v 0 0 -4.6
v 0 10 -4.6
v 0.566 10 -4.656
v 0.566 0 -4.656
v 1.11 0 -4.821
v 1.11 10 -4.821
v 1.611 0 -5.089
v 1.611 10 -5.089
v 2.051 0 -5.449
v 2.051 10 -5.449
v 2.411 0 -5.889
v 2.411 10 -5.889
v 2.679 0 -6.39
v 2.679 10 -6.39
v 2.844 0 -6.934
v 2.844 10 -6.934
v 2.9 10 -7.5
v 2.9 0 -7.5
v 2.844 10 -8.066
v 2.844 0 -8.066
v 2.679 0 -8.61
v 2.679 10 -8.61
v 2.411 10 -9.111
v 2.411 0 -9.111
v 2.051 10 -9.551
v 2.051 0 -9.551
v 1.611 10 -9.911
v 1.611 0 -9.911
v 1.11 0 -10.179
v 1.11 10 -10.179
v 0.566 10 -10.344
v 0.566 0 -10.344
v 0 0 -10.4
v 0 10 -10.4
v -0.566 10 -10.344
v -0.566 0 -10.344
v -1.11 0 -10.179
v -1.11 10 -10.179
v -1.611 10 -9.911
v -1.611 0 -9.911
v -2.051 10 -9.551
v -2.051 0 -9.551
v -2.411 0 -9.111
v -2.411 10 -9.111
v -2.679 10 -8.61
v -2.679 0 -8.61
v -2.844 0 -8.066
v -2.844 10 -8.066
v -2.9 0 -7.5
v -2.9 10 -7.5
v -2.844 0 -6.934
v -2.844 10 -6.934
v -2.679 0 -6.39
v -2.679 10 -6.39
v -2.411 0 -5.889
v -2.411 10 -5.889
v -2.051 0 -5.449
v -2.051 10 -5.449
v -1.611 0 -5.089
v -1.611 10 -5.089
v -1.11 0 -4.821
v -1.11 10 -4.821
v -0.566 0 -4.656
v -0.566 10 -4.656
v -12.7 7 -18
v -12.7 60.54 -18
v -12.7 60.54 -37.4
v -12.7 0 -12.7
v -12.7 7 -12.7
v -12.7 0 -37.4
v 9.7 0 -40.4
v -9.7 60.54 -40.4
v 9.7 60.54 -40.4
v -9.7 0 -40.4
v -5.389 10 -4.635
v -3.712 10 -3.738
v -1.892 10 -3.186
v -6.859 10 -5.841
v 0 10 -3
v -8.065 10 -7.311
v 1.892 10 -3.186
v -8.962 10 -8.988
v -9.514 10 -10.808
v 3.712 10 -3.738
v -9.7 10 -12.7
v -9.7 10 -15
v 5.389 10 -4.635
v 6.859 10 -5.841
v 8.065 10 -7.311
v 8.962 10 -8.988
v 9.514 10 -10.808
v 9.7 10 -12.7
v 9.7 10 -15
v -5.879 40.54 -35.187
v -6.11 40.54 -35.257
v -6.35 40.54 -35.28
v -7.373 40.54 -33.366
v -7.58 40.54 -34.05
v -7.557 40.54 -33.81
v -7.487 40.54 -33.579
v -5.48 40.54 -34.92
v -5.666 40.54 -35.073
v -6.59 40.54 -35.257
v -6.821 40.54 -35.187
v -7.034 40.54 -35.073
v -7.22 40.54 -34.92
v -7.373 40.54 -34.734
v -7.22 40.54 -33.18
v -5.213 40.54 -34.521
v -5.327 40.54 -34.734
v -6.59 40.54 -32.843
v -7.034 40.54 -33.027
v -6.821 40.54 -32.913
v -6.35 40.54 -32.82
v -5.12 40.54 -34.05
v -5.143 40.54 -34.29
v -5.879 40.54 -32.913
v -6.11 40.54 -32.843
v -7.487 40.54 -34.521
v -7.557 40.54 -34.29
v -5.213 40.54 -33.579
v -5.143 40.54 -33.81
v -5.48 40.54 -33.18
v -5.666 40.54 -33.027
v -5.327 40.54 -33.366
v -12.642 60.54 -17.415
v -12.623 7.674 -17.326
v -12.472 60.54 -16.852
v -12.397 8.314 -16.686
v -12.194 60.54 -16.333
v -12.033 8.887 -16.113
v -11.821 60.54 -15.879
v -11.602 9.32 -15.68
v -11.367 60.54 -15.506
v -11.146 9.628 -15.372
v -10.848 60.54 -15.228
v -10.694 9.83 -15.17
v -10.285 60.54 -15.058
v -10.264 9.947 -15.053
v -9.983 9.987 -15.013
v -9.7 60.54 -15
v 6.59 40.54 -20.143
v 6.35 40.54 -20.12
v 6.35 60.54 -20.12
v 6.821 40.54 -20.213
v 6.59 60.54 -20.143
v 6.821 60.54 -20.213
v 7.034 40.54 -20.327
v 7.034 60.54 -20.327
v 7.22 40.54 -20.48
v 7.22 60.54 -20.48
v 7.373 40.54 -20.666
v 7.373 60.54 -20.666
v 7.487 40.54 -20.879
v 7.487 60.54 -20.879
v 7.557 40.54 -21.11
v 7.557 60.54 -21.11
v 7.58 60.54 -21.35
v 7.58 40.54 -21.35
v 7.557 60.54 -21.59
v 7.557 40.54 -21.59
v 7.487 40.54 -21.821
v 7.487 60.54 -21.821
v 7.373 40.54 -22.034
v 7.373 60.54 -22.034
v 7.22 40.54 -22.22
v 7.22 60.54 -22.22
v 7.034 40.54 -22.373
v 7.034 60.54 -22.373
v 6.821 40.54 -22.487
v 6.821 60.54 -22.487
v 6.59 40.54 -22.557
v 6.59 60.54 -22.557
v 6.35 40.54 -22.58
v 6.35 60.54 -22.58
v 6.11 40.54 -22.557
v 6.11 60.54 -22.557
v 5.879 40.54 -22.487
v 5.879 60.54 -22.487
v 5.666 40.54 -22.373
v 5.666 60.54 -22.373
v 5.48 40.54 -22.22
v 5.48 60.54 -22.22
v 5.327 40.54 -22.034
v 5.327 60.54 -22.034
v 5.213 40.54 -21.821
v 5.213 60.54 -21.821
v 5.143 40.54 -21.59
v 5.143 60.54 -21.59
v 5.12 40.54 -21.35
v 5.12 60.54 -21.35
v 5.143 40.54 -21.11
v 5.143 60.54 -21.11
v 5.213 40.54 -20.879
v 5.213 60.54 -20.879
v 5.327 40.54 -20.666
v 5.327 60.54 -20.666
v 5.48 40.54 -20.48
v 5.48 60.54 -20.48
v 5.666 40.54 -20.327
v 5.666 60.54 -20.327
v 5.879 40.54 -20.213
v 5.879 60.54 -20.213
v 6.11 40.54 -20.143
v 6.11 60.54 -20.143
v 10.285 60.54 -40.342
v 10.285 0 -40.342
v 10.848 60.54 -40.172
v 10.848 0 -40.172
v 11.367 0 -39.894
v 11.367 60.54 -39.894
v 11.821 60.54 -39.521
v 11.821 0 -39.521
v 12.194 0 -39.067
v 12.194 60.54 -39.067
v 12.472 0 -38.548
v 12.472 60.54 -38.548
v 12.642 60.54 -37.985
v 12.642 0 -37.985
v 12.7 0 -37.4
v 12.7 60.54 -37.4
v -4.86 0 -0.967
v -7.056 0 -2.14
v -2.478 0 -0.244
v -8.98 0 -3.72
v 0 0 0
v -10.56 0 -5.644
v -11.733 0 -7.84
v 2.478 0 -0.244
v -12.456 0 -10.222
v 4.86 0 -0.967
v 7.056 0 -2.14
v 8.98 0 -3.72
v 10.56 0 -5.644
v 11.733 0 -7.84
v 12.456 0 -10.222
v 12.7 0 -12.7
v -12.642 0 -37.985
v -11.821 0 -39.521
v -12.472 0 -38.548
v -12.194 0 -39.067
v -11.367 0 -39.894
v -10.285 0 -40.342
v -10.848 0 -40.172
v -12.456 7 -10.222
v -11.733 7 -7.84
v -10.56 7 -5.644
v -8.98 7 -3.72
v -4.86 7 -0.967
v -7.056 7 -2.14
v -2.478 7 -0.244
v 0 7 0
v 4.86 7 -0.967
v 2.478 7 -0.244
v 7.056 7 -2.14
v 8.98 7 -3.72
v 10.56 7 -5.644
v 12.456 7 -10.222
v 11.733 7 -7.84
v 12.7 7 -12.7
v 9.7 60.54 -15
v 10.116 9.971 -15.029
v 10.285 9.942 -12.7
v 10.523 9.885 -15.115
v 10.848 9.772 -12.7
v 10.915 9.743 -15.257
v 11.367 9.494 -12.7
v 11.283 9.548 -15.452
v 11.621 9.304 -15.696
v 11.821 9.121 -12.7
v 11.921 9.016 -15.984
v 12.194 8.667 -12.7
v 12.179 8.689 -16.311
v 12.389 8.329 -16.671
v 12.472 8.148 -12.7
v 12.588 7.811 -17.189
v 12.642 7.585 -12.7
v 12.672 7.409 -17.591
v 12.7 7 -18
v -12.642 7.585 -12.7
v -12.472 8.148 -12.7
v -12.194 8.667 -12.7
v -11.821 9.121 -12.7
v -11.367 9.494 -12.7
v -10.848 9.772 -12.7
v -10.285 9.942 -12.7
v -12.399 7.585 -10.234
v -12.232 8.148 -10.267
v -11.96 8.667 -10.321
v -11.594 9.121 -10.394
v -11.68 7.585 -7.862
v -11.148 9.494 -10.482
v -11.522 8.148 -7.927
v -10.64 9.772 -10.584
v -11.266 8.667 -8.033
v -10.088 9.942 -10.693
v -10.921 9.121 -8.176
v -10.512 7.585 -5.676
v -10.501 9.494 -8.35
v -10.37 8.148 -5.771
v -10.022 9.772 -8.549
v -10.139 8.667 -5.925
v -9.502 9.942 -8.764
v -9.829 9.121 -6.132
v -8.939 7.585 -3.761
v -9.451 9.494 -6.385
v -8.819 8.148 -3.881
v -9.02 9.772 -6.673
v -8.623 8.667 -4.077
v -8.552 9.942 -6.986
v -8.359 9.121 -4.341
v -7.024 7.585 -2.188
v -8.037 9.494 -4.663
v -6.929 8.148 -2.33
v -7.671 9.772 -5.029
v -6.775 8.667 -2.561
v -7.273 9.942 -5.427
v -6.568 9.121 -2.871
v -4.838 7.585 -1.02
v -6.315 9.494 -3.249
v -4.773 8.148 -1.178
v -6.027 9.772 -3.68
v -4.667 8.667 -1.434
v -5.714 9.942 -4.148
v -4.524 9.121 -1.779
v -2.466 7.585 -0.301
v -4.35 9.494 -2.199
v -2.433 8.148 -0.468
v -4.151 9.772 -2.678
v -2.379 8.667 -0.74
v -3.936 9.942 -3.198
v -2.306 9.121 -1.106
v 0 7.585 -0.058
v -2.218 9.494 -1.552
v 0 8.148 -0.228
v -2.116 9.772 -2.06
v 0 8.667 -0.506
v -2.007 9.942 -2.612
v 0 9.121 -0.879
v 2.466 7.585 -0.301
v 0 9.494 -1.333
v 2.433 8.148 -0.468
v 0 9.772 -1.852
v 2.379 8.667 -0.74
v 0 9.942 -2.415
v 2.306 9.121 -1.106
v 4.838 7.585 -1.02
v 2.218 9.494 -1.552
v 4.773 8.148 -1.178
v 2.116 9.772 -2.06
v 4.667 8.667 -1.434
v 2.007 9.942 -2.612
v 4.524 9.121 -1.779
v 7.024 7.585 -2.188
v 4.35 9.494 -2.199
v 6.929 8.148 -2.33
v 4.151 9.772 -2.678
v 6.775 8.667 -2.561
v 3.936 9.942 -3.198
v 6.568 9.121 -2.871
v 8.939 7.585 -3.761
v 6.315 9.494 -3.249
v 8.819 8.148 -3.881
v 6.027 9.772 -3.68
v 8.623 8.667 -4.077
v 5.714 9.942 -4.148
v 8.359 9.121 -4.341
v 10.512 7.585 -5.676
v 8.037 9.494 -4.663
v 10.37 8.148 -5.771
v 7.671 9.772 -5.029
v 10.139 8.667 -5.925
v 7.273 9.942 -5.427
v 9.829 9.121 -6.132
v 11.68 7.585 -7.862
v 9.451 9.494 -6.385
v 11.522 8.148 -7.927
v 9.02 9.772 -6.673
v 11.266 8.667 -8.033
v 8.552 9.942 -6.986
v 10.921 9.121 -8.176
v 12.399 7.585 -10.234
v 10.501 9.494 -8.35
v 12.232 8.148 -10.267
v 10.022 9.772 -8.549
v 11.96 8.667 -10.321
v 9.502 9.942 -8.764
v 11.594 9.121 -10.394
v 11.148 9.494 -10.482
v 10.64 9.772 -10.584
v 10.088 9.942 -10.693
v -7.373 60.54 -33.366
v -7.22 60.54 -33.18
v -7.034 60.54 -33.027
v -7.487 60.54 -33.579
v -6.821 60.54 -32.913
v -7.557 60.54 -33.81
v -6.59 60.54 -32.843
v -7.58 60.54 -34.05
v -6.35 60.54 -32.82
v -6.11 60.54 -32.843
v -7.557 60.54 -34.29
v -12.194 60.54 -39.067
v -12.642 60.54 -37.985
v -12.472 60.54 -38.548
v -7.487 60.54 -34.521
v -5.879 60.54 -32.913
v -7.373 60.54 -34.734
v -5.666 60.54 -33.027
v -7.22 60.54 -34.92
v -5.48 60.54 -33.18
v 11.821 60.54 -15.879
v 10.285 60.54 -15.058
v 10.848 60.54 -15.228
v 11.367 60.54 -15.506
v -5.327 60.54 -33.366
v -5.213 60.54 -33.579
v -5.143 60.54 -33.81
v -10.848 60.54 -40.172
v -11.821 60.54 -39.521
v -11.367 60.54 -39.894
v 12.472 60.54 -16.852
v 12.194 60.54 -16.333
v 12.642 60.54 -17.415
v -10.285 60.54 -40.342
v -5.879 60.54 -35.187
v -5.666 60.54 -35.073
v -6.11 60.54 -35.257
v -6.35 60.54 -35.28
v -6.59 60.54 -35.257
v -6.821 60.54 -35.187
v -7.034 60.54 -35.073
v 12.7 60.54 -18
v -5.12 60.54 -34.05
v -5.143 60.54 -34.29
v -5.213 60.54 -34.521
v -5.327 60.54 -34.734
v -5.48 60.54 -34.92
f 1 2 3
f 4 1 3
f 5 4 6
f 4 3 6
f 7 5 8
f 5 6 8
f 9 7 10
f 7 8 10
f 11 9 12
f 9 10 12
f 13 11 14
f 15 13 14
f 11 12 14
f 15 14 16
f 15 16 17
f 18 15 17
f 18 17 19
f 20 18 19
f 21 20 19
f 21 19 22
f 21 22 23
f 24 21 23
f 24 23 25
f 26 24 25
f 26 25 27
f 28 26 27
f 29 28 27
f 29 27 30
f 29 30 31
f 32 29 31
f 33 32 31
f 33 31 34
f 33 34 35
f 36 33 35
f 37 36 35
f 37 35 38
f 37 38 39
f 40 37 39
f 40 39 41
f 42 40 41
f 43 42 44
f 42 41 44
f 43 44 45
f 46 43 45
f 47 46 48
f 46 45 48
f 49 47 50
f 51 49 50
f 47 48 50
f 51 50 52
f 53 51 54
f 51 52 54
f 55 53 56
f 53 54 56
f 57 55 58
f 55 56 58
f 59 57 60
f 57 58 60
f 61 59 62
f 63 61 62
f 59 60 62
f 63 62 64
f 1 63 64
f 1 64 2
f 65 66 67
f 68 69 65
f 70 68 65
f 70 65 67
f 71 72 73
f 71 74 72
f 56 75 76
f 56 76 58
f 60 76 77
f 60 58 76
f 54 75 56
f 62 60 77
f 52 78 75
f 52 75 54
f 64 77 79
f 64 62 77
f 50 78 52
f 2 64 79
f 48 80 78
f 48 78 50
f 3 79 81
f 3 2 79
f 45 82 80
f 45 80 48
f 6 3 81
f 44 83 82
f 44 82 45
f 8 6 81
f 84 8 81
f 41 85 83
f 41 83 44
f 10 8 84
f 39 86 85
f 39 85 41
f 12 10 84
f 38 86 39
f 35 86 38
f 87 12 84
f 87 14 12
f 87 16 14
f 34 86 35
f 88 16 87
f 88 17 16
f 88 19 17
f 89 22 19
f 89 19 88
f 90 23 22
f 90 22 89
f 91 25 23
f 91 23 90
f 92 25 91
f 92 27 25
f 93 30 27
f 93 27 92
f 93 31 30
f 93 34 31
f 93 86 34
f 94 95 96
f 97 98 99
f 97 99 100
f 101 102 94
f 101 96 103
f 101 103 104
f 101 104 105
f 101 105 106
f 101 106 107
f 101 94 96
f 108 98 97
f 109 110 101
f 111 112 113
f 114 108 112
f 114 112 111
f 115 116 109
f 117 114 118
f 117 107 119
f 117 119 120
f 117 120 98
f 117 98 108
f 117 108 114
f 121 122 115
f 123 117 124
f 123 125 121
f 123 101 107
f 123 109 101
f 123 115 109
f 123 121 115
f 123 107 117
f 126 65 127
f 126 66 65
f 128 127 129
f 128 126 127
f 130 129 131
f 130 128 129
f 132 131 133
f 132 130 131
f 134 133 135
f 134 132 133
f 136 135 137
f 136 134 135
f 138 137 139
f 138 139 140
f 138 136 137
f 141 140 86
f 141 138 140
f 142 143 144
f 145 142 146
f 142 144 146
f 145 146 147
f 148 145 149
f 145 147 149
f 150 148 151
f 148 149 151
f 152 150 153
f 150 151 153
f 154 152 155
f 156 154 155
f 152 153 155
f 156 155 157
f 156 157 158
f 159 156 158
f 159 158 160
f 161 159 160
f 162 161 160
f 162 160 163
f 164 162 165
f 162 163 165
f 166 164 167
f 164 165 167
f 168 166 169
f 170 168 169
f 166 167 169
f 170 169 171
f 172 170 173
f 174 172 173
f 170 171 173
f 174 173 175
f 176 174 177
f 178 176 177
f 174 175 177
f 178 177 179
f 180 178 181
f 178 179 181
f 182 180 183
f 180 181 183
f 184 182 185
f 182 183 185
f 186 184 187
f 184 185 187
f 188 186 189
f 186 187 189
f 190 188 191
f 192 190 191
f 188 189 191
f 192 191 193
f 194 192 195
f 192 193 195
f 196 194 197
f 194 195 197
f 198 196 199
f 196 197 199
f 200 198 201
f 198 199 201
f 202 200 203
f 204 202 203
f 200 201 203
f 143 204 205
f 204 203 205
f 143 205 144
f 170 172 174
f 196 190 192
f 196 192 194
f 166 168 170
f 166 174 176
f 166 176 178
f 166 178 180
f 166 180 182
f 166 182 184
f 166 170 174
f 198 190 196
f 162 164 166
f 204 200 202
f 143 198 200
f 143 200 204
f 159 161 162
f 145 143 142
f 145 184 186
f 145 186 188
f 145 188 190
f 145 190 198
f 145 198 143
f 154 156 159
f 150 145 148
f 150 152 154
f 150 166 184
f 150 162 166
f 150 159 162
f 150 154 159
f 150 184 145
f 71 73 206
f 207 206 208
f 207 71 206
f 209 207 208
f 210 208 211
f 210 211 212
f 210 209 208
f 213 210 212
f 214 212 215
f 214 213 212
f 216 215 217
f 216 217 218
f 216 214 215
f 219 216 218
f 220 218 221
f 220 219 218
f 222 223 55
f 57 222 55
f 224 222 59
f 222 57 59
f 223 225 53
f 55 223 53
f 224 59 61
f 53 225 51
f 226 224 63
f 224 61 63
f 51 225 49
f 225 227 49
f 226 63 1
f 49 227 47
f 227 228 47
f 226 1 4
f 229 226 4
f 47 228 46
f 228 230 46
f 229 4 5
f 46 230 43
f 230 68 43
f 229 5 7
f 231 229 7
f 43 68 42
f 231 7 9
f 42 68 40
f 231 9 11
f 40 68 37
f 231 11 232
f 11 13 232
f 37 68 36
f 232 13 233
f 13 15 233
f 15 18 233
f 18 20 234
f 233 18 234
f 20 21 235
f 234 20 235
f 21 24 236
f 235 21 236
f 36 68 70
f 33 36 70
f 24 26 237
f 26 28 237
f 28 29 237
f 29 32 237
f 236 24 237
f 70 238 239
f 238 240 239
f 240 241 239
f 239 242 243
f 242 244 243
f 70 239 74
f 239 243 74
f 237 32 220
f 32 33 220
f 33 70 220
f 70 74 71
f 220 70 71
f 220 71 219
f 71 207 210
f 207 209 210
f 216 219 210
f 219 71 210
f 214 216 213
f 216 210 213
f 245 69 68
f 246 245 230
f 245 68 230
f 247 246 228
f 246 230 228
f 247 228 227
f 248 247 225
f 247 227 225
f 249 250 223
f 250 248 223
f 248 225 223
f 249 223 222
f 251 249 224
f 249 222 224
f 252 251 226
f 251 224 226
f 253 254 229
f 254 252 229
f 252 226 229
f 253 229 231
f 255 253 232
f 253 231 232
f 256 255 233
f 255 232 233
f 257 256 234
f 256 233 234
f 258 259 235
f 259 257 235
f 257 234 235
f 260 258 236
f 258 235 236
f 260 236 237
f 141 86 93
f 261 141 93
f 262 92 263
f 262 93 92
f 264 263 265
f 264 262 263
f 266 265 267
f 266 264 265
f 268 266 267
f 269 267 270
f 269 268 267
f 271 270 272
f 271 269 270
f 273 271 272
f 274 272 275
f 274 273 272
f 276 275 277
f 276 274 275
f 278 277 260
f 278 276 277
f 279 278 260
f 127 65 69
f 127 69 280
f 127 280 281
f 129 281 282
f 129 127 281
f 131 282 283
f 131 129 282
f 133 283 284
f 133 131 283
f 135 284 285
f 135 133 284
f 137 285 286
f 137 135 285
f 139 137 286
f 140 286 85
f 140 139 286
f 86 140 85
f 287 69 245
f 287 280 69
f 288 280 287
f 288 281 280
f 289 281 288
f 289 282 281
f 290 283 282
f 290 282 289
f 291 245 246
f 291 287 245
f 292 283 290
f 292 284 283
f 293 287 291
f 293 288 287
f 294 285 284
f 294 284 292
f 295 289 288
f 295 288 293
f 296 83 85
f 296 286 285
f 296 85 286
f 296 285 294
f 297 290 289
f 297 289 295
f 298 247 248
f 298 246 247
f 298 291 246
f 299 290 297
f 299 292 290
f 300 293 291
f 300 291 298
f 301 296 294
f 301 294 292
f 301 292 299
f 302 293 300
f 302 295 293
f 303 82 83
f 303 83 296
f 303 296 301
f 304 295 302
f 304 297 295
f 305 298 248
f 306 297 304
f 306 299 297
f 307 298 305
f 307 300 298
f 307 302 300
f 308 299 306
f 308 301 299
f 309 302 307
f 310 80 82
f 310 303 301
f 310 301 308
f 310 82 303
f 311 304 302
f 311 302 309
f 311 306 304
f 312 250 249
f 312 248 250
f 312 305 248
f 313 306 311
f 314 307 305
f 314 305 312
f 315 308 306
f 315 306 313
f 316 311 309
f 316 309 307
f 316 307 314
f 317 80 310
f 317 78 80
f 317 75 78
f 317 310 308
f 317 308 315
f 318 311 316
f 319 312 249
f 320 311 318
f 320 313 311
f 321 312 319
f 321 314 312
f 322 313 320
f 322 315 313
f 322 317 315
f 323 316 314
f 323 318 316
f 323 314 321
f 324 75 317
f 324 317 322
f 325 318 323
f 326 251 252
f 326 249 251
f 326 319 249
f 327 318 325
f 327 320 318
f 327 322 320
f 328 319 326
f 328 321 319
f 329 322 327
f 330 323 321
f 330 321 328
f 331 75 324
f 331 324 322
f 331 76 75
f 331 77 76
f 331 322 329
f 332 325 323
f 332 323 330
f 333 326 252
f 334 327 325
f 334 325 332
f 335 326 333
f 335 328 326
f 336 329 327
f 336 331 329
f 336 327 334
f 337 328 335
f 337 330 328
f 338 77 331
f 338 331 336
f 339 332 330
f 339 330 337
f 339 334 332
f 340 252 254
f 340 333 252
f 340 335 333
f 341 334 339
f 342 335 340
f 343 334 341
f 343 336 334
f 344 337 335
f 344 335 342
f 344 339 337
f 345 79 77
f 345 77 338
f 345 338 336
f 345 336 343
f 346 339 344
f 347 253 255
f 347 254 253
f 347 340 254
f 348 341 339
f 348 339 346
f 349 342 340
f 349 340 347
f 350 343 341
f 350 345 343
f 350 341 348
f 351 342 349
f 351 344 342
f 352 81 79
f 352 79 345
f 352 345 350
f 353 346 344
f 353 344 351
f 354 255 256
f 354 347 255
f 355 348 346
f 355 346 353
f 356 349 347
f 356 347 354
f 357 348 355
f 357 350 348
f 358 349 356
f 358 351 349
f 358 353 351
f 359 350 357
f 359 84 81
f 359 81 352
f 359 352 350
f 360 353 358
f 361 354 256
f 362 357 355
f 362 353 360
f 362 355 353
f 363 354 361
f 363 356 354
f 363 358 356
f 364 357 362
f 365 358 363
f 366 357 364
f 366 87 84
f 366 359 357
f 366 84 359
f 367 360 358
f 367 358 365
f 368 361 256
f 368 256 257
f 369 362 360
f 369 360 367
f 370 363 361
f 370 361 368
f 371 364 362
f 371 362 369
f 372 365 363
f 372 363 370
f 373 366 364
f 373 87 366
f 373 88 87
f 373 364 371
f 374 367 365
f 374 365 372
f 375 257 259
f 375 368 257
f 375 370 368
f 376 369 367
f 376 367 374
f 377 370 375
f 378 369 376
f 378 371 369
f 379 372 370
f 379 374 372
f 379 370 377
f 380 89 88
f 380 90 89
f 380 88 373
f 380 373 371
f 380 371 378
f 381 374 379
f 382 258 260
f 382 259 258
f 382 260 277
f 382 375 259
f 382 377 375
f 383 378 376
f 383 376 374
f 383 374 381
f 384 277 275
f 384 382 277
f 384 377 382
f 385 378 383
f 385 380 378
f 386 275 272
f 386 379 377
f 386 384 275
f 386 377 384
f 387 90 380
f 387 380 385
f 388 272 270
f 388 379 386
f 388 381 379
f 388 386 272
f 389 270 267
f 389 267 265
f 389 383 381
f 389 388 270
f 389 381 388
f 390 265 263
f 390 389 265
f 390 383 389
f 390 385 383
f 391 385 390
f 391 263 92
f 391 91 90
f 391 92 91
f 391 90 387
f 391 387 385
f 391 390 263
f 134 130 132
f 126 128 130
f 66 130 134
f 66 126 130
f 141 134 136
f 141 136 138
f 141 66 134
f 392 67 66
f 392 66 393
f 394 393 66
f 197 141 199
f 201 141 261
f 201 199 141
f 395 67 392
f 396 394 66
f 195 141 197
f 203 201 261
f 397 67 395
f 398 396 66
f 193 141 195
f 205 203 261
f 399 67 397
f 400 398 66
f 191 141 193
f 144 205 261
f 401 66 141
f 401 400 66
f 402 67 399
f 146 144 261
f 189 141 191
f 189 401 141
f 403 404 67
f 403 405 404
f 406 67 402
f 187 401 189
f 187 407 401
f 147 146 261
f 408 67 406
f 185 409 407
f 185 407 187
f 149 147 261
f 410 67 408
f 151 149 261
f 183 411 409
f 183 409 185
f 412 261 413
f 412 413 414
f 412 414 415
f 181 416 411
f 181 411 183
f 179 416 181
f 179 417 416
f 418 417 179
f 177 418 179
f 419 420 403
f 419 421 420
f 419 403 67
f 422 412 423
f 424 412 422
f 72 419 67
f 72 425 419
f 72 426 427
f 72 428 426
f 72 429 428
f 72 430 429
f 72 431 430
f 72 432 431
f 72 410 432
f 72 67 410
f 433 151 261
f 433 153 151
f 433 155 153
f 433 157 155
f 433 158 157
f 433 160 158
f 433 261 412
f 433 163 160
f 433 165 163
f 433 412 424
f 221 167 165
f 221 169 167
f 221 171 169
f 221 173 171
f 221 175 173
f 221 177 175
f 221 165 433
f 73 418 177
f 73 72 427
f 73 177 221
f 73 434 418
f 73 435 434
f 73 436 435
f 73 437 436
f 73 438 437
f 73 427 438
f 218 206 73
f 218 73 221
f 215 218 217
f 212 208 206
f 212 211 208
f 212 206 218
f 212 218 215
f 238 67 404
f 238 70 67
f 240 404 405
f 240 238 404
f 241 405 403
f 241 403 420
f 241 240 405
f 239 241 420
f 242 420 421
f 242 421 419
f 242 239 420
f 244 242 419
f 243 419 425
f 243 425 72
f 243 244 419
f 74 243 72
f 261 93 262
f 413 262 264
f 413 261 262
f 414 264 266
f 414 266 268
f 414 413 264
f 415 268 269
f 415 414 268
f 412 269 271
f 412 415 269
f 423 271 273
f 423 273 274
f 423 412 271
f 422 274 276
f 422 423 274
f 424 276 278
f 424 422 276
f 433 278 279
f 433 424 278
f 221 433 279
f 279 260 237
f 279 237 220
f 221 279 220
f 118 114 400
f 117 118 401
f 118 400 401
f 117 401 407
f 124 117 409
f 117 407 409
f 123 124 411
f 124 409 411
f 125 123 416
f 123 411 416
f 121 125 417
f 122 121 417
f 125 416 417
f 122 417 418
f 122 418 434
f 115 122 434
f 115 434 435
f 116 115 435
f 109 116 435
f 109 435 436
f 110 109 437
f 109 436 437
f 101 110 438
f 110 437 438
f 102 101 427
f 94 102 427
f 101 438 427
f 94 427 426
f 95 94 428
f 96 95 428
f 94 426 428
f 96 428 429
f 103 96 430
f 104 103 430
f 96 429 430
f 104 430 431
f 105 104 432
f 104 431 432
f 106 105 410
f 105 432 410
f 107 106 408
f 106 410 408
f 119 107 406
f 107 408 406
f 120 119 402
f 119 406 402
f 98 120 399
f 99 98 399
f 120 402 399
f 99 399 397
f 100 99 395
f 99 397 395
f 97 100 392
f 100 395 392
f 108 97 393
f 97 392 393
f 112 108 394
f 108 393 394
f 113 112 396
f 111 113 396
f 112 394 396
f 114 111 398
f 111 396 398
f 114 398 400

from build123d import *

# Parameters (mm, degrees)
SKETCH1_W           = 25.4
SKETCH1_H           = 40.4
BOSS_EXTRUDE1_DEPTH = 10
SKETCH2_W           = 25.4
SKETCH2_H           = 25.4
BOSS_EXTRUDE2_DEPTH = 50.54
SKETCH3_R           = 1.2303
CUT_EXTRUDE1_DEPTH  = 20
SKETCH4_R           = 2.9
CUT_EXTRUDE2_DEPTH  = 66.937406682
FILLET1_R           = 3
FILLET2_R           = 12.7


with BuildPart() as part:
    # Sketch1 → Boss-Extrude1 (new body)
    with BuildSketch(Plane(origin=(0, 0, 0), x_dir=(1, 0, 0), z_dir=(0, 1, 0))):
        with Locations((0, 20.2)):
            Rectangle(SKETCH1_W, SKETCH1_H)
    extrude(amount=BOSS_EXTRUDE1_DEPTH)

    # Sketch2 → Boss-Extrude2 (add)
    with BuildSketch(Plane(origin=(0, 10, 0), x_dir=(1, 0, 0), z_dir=(0, 1, 0))):
        with Locations((0, 27.7)):
            Rectangle(SKETCH2_W, SKETCH2_H)
    extrude(amount=BOSS_EXTRUDE2_DEPTH)

    # Sketch3 → Cut-Extrude1 (cut)
    with BuildSketch(Plane(origin=(0, 60.54, 0), x_dir=(1, 0, 0), z_dir=(0, 1, 0))):
        with Locations(Location((-6.35, 34.05, 0), (0, 0, 270))):
            Circle(SKETCH3_R)
        with Locations(Location((6.35, 21.35, 0), (0, 0, 270))):
            Circle(SKETCH3_R)
    extrude(amount=-CUT_EXTRUDE1_DEPTH, mode=Mode.SUBTRACT)

    # Sketch4 → Cut-Extrude2 (cut, through all)
    with BuildSketch(Plane(origin=(0, 10, 0), x_dir=(1, 0, 0), z_dir=(0, 1, 0))):
        with Locations(Location((0, 7.5, 0), (0, 0, 270))):
            Circle(SKETCH4_R)
    extrude(amount=-CUT_EXTRUDE2_DEPTH, mode=Mode.SUBTRACT)

    # Fillet1
    fillet1_edges = [part.edges().sort_by_distance(p)[0] for p in [
        (12.7, 10, -7.5),
        (-12.7, 10, -7.5),
        (-12.7, 35.27, -15),
        (12.7, 35.27, -15),
        (0, 10, 0),
        (-12.7, 30.27, -40.4),
        (12.7, 30.27, -40.4),
    ]]
    fillet(fillet1_edges, radius=FILLET1_R)

    # Fillet2
    # the kernel refuses this fillet: 12.7 mm, written as the material it takes off along each edge
    with BuildSketch(Plane(origin=(0, 10, -12.7), x_dir=(-1, 0, 0), z_dir=(0, 0, -1))) as fillet2_piece_1:
        with BuildLine():
            CenterArc((9.7, -3), 3, 0, 90)
            Line((12.7, -3), (12.7, 0))
            Line((12.7, 0), (9.7, 0))
        make_face()
    revolve(axis=Axis((0, 10, -12.7), (0, 1, 0)), revolution_arc=90, mode=Mode.SUBTRACT)
    with BuildSketch(Plane(origin=(0, 10, -12.7), x_dir=(0, 0, 1), z_dir=(-1, 0, 0))) as fillet2_piece_2:
        with BuildLine():
            CenterArc((9.7, -3), 3, 0, 90)
            Line((12.7, -3), (12.7, 0))
            Line((12.7, 0), (9.7, 0))
        make_face()
    revolve(axis=Axis((0, 10, -12.7), (0, 1, 0)), revolution_arc=90, mode=Mode.SUBTRACT)
    with BuildSketch(Plane(origin=(12.7, -31.75, 0), x_dir=(0, 0, -1), z_dir=(0, 1, 0))) as fillet2_piece_3:
        with BuildLine():
            CenterArc((FILLET2_R, FILLET2_R), FILLET2_R, 180, 90)
            Line((0, FILLET2_R), (0, 0))
            Line((0, 0), (FILLET2_R, 0))
        make_face()
    extrude(amount=41.75, mode=Mode.SUBTRACT)
    with BuildSketch(Plane(origin=(-12.7, -31.75, 0), x_dir=(0, 0, -1), z_dir=(0, 1, 0))) as fillet2_piece_4:
        with BuildLine():
            CenterArc((FILLET2_R, -FILLET2_R), FILLET2_R, 90, 90)
            Line((0, -FILLET2_R), (0, 0))
            Line((0, 0), (FILLET2_R, 0))
        make_face()
    extrude(amount=41.75, mode=Mode.SUBTRACT)


solid = part.part
